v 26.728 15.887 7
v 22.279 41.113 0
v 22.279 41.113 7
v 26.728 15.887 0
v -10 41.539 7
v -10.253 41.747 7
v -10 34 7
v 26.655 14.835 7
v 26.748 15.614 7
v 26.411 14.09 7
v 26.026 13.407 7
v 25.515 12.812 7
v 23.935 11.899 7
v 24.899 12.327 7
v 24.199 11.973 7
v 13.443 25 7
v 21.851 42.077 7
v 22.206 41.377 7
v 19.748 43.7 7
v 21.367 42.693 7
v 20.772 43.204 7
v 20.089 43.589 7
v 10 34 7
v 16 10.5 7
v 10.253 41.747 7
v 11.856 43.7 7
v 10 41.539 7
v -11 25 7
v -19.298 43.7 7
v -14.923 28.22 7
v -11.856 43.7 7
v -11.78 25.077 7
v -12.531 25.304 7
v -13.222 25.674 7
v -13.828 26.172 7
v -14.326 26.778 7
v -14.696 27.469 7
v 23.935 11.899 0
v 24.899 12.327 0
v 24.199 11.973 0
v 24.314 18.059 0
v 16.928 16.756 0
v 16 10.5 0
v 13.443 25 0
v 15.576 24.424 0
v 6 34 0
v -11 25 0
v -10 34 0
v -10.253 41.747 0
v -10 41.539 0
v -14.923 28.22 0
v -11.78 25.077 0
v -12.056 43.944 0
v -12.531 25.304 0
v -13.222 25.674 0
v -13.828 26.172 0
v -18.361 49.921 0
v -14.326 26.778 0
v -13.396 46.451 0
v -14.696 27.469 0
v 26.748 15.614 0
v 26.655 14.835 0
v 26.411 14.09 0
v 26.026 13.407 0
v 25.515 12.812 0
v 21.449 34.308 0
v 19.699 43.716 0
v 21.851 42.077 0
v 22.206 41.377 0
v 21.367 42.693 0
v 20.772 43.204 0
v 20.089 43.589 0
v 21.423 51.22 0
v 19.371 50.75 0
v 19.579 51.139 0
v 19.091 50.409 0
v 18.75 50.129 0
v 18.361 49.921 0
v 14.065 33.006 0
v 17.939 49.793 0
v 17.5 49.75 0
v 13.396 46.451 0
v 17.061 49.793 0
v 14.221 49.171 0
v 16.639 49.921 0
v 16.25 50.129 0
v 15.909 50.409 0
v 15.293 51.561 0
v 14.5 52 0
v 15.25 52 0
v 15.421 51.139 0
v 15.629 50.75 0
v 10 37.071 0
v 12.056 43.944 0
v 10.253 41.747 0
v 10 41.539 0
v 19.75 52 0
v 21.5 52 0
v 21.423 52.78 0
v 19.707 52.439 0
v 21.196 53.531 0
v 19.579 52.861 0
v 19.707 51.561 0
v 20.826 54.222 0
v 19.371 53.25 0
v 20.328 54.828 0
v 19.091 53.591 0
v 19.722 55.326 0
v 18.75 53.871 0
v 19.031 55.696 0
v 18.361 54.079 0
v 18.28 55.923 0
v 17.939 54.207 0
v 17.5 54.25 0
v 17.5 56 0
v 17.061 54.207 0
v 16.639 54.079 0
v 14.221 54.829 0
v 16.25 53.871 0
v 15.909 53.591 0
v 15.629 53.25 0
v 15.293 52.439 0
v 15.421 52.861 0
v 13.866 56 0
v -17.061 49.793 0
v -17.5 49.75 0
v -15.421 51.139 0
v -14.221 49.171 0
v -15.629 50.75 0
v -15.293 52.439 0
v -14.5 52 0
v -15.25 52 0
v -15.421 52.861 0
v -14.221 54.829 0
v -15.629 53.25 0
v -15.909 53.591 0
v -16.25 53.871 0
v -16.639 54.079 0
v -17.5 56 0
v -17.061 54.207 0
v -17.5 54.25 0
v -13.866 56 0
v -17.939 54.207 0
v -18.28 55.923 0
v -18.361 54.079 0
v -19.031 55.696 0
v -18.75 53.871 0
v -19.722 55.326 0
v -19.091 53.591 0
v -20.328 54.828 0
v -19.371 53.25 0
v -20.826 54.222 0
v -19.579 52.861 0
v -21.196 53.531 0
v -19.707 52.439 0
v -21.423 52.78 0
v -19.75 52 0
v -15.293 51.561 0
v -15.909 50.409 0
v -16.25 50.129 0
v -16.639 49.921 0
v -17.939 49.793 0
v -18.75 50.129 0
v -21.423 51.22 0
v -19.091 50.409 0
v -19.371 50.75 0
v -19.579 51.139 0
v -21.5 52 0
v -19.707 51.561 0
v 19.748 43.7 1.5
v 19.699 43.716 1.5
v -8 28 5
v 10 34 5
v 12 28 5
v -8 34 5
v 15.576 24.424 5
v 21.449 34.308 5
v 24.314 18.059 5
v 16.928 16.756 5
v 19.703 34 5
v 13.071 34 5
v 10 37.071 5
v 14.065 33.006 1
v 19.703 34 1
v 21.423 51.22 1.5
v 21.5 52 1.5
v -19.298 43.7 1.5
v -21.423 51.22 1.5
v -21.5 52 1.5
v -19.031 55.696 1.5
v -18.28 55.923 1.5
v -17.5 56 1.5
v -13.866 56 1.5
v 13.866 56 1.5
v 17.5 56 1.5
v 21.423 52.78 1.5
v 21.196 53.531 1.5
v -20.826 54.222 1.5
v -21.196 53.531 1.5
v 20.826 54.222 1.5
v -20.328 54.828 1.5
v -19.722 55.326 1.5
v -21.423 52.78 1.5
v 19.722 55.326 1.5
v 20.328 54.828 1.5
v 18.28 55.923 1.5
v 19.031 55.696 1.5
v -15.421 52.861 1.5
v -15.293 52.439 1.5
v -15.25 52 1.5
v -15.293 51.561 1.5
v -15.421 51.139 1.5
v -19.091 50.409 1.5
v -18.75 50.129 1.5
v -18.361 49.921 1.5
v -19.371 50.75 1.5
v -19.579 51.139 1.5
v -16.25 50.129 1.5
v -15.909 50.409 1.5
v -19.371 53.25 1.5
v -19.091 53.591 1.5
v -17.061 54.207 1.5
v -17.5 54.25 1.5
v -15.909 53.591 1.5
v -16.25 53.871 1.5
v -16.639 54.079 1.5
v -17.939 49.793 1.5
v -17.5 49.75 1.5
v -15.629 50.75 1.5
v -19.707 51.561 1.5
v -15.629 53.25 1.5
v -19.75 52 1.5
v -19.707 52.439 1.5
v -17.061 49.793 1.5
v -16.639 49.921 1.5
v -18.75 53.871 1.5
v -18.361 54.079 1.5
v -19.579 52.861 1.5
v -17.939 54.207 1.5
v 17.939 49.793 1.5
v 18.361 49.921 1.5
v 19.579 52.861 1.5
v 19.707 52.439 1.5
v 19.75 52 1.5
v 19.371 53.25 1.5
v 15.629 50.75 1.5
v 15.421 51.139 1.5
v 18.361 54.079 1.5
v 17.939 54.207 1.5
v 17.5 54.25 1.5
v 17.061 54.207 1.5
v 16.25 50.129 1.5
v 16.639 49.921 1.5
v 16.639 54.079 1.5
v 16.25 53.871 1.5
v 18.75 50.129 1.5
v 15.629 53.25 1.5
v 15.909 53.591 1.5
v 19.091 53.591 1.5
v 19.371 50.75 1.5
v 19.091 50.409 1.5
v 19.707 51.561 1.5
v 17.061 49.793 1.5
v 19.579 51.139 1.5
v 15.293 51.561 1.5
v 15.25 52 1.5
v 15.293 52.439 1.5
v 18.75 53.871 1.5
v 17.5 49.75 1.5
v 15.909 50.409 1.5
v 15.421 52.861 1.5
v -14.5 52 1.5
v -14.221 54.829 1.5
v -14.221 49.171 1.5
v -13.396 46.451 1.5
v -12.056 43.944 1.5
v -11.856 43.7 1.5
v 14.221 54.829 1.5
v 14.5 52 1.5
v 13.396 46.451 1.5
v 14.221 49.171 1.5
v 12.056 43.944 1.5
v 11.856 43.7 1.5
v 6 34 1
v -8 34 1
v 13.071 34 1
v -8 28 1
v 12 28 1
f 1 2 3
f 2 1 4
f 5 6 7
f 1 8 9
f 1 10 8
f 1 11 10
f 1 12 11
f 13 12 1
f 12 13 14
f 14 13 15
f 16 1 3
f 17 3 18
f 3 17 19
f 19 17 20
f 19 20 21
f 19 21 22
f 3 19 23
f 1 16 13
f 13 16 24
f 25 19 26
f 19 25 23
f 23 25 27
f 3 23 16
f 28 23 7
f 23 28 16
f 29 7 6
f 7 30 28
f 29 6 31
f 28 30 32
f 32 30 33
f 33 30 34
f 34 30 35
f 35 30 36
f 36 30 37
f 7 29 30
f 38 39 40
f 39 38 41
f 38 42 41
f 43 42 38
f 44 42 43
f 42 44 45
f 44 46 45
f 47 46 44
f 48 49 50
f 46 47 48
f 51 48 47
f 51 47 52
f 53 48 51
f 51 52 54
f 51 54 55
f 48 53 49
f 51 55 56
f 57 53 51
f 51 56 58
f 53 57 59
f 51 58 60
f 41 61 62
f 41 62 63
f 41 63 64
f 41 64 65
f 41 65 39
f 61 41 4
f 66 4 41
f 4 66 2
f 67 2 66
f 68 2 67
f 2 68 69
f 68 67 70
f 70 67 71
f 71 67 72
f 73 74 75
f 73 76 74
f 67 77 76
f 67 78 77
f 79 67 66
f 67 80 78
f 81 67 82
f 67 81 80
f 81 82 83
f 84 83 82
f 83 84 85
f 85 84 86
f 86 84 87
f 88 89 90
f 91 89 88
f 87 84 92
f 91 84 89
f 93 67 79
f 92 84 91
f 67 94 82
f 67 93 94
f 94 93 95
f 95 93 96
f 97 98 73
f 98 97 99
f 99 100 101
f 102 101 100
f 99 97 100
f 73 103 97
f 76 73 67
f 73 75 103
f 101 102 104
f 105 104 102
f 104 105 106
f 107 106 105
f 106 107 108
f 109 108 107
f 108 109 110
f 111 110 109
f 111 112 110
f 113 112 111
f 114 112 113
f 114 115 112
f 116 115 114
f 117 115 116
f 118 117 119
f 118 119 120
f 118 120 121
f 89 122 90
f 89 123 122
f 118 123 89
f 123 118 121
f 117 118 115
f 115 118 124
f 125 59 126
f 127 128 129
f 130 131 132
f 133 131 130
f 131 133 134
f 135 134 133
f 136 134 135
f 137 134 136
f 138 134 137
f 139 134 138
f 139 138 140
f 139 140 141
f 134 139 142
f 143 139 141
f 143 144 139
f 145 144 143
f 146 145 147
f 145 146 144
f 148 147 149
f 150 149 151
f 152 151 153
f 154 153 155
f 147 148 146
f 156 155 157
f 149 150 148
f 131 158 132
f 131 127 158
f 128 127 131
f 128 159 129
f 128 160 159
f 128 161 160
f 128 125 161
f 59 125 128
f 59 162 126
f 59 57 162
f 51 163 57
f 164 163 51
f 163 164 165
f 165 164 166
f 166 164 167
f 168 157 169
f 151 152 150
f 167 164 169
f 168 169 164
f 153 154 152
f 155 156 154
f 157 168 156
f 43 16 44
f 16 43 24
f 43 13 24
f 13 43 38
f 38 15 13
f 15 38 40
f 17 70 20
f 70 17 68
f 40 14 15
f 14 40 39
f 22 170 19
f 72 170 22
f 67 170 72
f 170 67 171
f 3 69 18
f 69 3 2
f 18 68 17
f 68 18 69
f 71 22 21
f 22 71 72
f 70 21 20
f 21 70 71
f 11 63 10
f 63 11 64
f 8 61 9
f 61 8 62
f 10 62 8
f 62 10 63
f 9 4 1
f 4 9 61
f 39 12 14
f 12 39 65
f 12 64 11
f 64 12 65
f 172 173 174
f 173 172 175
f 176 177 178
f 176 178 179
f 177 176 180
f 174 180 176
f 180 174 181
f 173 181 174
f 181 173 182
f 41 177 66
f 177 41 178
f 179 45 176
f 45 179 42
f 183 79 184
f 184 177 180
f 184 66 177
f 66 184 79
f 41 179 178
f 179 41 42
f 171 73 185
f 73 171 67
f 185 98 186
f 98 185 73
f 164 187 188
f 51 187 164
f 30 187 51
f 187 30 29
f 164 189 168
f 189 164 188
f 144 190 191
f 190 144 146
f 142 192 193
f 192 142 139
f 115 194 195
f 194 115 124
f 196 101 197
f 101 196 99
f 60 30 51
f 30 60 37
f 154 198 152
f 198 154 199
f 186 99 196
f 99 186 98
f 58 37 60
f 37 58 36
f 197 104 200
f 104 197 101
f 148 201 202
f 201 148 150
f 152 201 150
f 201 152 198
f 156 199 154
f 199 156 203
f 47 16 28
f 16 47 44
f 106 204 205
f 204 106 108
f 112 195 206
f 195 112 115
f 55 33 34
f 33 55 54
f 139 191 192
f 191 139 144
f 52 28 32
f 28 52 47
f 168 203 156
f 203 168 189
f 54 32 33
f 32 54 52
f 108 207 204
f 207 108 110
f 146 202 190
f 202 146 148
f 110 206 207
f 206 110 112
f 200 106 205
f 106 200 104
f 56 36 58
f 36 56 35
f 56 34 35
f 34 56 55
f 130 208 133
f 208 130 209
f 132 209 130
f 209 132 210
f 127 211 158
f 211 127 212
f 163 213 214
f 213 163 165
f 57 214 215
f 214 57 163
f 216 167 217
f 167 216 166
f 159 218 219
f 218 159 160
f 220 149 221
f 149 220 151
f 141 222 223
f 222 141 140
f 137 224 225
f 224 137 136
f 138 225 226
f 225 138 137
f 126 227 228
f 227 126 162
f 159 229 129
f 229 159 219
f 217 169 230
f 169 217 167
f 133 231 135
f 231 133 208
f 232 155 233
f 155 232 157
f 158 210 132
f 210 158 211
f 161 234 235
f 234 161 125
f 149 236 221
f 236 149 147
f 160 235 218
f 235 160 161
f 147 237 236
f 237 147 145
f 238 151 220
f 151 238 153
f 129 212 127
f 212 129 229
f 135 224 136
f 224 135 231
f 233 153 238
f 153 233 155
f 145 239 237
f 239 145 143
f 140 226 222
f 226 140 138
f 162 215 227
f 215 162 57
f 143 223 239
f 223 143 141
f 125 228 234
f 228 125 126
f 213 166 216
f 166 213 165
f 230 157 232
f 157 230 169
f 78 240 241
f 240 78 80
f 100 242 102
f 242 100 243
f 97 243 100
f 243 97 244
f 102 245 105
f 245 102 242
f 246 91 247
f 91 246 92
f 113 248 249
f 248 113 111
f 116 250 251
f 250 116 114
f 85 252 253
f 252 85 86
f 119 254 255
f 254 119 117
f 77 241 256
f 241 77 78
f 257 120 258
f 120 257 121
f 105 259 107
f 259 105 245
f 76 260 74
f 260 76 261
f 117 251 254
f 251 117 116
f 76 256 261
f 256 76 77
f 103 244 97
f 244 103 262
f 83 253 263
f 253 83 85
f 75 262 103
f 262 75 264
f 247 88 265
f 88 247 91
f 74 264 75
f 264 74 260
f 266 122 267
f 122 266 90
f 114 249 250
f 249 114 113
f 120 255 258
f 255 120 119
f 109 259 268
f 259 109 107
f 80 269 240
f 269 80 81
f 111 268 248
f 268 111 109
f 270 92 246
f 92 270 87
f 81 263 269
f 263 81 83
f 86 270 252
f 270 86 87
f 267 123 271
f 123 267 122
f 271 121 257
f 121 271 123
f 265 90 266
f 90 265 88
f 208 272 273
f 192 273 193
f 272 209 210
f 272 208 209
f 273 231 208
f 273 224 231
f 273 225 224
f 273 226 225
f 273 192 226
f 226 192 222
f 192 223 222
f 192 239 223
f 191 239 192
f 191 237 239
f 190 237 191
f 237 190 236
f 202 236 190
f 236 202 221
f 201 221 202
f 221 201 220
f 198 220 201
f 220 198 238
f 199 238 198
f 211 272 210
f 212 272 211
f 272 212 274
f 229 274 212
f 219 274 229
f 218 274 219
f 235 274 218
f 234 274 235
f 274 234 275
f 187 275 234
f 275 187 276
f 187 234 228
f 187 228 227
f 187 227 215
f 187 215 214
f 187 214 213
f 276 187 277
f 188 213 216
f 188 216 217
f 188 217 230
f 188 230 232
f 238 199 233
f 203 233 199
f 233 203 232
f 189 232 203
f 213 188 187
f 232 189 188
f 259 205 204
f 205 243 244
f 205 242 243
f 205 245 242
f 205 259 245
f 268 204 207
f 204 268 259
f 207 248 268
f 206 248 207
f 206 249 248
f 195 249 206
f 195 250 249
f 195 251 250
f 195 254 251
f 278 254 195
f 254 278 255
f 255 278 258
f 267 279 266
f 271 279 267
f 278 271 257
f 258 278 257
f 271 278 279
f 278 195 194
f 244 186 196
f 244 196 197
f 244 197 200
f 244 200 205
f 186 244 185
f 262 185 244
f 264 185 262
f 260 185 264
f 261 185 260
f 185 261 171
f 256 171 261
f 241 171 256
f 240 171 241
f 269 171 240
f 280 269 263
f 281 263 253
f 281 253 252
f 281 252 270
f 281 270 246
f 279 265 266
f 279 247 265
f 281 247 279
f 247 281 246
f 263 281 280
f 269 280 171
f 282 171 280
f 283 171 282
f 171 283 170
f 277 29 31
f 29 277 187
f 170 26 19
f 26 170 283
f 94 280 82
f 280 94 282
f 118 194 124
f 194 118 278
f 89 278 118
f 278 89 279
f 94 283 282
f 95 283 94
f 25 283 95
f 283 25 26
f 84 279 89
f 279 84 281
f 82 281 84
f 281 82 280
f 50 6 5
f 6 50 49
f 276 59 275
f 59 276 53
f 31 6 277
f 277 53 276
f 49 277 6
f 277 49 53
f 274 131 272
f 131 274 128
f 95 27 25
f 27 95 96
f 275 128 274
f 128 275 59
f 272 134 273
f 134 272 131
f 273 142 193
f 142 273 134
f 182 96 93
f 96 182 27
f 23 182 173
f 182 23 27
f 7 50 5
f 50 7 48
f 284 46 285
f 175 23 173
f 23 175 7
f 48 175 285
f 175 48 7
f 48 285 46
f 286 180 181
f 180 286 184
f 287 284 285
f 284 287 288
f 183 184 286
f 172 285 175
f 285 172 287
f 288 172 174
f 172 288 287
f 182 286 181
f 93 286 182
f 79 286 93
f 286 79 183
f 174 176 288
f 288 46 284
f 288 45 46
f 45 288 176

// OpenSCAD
use <libs/compact_nut_seat.scad>
include <libs/microscope_parameters.scad>
use <libs/utilities.scad>
use <../rendering/librender/electronics.scad>
use <../rendering/librender/render_utils.scad>
use <./libs/gears.scad>

//estimated angle
a_to_wall = 10;
params = default_params();

//rendered();
to_print();

module rendered(){

    coloured_render("WhiteSmoke"){
        augmented_screw_seat(h=43.8);
    }

    render(6){
        translate([0,0,43.8]){
            cable_thing();
        }
    }

    coloured_render("DodgerBlue"){
        translate([0, 0, 32.5]){
            large_gear();
        }
    }


    motor28BYJ48(create_placement_dict([0,20,43],[0, 0, 180]),
                create_placement_dict([20,-15,-43], [0,0,90+a_to_wall]),
                [[0,-10,45],[20,-10,45]]);
}

module to_print(){

    //augmented_screw_seat();
    translate([0, 40, 0]){
            cable_thing();
    }

}


function connector_size() = [5.5, 14.5, 8];
function housing_size(h=43.8) = [connector_size().x+4+2,connector_size().y+4+2+12, h];


module side_housing_placement(){
    translate([16, -housing_size().y+3, 0]){
        rotate([0, 0, a_to_wall]){
            children();
        }
    }
}

module side_housing(h=43.8, cavity_h=undef){
    c_h = is_undef(cavity_h) ? h+1 : cavity_h;
    difference(){
        side_housing_placement(){
            intersection(){
                cube(housing_size(h));
                hull(){
                    translate([housing_size().x-4+tiny(),4-tiny(),0]){
                        cylinder(r=4,h=999,center=true);
                    }
                    translate([housing_size().x-4+tiny(),housing_size().y-4+tiny(),0]){
                        cylinder(r=4,h=999,center=true);
                    }
                    translate([-99,4-tiny(),0]){
                        cylinder(r=4,h=999,center=true);
                    }
                    translate([-99,housing_size().y-4+tiny(),0]){
                        cylinder(r=4,h=999,center=true);
                    }
                }
            }
        }
        side_housing_cutout(c_h);
    }
}

module side_housing_cutout(h){
    housing_cut_size = [connector_size().x+2,connector_size().y+2, h+1];
    side_housing_placement(){
        translate([2, 6, -1]){
            cube(housing_cut_size);
        }
    }
}

module augmented_screw_seat(h=43.8){
    xy_screw_seat(params);
    difference(){
            side_housing(h=h);
        translate([0,0,29]){
            cylinder(d=30, h=80);
        }
    }
}

module cable_thing(h=7){
    difference(){
        union(){
            hull(){
                for(x_tr = [-.5, .5]*35){
                    translate([x_tr,12,0]){
                        cylinder(d=8, h=h);
                    }
                }
                translate([-11,-11,0]){
                    cylinder(d=8, h=h);
                }
                translate([15,-14.5,0]){
                    cylinder(d=1, h=h);
                }
                
            }
            side_housing(h=h,cavity_h=h-2);
        }
        translate([-50,3.7,1.5]){
            cube([100,100,100]);
        }
        translate([0,12,-1]){
            cylinder(d=29, h=21);
        }
        translate([-10,-6,-1]){
            cube([20,100,21]);
        }
        translate([-8,-12,1]){
            cube([28,6,h-3]);
        }
        translate([0,0,-1]){
            rotate([0,0,-45]){
                cube([25,5,h-1]);
            }
        }
        for(x_tr = [-.5, .5]*35){
            translate([x_tr,12,0]){
                cylinder(d=4.5, h=h, center=true);
            }
        }
        side_housing_cutout(3);
    }
}
